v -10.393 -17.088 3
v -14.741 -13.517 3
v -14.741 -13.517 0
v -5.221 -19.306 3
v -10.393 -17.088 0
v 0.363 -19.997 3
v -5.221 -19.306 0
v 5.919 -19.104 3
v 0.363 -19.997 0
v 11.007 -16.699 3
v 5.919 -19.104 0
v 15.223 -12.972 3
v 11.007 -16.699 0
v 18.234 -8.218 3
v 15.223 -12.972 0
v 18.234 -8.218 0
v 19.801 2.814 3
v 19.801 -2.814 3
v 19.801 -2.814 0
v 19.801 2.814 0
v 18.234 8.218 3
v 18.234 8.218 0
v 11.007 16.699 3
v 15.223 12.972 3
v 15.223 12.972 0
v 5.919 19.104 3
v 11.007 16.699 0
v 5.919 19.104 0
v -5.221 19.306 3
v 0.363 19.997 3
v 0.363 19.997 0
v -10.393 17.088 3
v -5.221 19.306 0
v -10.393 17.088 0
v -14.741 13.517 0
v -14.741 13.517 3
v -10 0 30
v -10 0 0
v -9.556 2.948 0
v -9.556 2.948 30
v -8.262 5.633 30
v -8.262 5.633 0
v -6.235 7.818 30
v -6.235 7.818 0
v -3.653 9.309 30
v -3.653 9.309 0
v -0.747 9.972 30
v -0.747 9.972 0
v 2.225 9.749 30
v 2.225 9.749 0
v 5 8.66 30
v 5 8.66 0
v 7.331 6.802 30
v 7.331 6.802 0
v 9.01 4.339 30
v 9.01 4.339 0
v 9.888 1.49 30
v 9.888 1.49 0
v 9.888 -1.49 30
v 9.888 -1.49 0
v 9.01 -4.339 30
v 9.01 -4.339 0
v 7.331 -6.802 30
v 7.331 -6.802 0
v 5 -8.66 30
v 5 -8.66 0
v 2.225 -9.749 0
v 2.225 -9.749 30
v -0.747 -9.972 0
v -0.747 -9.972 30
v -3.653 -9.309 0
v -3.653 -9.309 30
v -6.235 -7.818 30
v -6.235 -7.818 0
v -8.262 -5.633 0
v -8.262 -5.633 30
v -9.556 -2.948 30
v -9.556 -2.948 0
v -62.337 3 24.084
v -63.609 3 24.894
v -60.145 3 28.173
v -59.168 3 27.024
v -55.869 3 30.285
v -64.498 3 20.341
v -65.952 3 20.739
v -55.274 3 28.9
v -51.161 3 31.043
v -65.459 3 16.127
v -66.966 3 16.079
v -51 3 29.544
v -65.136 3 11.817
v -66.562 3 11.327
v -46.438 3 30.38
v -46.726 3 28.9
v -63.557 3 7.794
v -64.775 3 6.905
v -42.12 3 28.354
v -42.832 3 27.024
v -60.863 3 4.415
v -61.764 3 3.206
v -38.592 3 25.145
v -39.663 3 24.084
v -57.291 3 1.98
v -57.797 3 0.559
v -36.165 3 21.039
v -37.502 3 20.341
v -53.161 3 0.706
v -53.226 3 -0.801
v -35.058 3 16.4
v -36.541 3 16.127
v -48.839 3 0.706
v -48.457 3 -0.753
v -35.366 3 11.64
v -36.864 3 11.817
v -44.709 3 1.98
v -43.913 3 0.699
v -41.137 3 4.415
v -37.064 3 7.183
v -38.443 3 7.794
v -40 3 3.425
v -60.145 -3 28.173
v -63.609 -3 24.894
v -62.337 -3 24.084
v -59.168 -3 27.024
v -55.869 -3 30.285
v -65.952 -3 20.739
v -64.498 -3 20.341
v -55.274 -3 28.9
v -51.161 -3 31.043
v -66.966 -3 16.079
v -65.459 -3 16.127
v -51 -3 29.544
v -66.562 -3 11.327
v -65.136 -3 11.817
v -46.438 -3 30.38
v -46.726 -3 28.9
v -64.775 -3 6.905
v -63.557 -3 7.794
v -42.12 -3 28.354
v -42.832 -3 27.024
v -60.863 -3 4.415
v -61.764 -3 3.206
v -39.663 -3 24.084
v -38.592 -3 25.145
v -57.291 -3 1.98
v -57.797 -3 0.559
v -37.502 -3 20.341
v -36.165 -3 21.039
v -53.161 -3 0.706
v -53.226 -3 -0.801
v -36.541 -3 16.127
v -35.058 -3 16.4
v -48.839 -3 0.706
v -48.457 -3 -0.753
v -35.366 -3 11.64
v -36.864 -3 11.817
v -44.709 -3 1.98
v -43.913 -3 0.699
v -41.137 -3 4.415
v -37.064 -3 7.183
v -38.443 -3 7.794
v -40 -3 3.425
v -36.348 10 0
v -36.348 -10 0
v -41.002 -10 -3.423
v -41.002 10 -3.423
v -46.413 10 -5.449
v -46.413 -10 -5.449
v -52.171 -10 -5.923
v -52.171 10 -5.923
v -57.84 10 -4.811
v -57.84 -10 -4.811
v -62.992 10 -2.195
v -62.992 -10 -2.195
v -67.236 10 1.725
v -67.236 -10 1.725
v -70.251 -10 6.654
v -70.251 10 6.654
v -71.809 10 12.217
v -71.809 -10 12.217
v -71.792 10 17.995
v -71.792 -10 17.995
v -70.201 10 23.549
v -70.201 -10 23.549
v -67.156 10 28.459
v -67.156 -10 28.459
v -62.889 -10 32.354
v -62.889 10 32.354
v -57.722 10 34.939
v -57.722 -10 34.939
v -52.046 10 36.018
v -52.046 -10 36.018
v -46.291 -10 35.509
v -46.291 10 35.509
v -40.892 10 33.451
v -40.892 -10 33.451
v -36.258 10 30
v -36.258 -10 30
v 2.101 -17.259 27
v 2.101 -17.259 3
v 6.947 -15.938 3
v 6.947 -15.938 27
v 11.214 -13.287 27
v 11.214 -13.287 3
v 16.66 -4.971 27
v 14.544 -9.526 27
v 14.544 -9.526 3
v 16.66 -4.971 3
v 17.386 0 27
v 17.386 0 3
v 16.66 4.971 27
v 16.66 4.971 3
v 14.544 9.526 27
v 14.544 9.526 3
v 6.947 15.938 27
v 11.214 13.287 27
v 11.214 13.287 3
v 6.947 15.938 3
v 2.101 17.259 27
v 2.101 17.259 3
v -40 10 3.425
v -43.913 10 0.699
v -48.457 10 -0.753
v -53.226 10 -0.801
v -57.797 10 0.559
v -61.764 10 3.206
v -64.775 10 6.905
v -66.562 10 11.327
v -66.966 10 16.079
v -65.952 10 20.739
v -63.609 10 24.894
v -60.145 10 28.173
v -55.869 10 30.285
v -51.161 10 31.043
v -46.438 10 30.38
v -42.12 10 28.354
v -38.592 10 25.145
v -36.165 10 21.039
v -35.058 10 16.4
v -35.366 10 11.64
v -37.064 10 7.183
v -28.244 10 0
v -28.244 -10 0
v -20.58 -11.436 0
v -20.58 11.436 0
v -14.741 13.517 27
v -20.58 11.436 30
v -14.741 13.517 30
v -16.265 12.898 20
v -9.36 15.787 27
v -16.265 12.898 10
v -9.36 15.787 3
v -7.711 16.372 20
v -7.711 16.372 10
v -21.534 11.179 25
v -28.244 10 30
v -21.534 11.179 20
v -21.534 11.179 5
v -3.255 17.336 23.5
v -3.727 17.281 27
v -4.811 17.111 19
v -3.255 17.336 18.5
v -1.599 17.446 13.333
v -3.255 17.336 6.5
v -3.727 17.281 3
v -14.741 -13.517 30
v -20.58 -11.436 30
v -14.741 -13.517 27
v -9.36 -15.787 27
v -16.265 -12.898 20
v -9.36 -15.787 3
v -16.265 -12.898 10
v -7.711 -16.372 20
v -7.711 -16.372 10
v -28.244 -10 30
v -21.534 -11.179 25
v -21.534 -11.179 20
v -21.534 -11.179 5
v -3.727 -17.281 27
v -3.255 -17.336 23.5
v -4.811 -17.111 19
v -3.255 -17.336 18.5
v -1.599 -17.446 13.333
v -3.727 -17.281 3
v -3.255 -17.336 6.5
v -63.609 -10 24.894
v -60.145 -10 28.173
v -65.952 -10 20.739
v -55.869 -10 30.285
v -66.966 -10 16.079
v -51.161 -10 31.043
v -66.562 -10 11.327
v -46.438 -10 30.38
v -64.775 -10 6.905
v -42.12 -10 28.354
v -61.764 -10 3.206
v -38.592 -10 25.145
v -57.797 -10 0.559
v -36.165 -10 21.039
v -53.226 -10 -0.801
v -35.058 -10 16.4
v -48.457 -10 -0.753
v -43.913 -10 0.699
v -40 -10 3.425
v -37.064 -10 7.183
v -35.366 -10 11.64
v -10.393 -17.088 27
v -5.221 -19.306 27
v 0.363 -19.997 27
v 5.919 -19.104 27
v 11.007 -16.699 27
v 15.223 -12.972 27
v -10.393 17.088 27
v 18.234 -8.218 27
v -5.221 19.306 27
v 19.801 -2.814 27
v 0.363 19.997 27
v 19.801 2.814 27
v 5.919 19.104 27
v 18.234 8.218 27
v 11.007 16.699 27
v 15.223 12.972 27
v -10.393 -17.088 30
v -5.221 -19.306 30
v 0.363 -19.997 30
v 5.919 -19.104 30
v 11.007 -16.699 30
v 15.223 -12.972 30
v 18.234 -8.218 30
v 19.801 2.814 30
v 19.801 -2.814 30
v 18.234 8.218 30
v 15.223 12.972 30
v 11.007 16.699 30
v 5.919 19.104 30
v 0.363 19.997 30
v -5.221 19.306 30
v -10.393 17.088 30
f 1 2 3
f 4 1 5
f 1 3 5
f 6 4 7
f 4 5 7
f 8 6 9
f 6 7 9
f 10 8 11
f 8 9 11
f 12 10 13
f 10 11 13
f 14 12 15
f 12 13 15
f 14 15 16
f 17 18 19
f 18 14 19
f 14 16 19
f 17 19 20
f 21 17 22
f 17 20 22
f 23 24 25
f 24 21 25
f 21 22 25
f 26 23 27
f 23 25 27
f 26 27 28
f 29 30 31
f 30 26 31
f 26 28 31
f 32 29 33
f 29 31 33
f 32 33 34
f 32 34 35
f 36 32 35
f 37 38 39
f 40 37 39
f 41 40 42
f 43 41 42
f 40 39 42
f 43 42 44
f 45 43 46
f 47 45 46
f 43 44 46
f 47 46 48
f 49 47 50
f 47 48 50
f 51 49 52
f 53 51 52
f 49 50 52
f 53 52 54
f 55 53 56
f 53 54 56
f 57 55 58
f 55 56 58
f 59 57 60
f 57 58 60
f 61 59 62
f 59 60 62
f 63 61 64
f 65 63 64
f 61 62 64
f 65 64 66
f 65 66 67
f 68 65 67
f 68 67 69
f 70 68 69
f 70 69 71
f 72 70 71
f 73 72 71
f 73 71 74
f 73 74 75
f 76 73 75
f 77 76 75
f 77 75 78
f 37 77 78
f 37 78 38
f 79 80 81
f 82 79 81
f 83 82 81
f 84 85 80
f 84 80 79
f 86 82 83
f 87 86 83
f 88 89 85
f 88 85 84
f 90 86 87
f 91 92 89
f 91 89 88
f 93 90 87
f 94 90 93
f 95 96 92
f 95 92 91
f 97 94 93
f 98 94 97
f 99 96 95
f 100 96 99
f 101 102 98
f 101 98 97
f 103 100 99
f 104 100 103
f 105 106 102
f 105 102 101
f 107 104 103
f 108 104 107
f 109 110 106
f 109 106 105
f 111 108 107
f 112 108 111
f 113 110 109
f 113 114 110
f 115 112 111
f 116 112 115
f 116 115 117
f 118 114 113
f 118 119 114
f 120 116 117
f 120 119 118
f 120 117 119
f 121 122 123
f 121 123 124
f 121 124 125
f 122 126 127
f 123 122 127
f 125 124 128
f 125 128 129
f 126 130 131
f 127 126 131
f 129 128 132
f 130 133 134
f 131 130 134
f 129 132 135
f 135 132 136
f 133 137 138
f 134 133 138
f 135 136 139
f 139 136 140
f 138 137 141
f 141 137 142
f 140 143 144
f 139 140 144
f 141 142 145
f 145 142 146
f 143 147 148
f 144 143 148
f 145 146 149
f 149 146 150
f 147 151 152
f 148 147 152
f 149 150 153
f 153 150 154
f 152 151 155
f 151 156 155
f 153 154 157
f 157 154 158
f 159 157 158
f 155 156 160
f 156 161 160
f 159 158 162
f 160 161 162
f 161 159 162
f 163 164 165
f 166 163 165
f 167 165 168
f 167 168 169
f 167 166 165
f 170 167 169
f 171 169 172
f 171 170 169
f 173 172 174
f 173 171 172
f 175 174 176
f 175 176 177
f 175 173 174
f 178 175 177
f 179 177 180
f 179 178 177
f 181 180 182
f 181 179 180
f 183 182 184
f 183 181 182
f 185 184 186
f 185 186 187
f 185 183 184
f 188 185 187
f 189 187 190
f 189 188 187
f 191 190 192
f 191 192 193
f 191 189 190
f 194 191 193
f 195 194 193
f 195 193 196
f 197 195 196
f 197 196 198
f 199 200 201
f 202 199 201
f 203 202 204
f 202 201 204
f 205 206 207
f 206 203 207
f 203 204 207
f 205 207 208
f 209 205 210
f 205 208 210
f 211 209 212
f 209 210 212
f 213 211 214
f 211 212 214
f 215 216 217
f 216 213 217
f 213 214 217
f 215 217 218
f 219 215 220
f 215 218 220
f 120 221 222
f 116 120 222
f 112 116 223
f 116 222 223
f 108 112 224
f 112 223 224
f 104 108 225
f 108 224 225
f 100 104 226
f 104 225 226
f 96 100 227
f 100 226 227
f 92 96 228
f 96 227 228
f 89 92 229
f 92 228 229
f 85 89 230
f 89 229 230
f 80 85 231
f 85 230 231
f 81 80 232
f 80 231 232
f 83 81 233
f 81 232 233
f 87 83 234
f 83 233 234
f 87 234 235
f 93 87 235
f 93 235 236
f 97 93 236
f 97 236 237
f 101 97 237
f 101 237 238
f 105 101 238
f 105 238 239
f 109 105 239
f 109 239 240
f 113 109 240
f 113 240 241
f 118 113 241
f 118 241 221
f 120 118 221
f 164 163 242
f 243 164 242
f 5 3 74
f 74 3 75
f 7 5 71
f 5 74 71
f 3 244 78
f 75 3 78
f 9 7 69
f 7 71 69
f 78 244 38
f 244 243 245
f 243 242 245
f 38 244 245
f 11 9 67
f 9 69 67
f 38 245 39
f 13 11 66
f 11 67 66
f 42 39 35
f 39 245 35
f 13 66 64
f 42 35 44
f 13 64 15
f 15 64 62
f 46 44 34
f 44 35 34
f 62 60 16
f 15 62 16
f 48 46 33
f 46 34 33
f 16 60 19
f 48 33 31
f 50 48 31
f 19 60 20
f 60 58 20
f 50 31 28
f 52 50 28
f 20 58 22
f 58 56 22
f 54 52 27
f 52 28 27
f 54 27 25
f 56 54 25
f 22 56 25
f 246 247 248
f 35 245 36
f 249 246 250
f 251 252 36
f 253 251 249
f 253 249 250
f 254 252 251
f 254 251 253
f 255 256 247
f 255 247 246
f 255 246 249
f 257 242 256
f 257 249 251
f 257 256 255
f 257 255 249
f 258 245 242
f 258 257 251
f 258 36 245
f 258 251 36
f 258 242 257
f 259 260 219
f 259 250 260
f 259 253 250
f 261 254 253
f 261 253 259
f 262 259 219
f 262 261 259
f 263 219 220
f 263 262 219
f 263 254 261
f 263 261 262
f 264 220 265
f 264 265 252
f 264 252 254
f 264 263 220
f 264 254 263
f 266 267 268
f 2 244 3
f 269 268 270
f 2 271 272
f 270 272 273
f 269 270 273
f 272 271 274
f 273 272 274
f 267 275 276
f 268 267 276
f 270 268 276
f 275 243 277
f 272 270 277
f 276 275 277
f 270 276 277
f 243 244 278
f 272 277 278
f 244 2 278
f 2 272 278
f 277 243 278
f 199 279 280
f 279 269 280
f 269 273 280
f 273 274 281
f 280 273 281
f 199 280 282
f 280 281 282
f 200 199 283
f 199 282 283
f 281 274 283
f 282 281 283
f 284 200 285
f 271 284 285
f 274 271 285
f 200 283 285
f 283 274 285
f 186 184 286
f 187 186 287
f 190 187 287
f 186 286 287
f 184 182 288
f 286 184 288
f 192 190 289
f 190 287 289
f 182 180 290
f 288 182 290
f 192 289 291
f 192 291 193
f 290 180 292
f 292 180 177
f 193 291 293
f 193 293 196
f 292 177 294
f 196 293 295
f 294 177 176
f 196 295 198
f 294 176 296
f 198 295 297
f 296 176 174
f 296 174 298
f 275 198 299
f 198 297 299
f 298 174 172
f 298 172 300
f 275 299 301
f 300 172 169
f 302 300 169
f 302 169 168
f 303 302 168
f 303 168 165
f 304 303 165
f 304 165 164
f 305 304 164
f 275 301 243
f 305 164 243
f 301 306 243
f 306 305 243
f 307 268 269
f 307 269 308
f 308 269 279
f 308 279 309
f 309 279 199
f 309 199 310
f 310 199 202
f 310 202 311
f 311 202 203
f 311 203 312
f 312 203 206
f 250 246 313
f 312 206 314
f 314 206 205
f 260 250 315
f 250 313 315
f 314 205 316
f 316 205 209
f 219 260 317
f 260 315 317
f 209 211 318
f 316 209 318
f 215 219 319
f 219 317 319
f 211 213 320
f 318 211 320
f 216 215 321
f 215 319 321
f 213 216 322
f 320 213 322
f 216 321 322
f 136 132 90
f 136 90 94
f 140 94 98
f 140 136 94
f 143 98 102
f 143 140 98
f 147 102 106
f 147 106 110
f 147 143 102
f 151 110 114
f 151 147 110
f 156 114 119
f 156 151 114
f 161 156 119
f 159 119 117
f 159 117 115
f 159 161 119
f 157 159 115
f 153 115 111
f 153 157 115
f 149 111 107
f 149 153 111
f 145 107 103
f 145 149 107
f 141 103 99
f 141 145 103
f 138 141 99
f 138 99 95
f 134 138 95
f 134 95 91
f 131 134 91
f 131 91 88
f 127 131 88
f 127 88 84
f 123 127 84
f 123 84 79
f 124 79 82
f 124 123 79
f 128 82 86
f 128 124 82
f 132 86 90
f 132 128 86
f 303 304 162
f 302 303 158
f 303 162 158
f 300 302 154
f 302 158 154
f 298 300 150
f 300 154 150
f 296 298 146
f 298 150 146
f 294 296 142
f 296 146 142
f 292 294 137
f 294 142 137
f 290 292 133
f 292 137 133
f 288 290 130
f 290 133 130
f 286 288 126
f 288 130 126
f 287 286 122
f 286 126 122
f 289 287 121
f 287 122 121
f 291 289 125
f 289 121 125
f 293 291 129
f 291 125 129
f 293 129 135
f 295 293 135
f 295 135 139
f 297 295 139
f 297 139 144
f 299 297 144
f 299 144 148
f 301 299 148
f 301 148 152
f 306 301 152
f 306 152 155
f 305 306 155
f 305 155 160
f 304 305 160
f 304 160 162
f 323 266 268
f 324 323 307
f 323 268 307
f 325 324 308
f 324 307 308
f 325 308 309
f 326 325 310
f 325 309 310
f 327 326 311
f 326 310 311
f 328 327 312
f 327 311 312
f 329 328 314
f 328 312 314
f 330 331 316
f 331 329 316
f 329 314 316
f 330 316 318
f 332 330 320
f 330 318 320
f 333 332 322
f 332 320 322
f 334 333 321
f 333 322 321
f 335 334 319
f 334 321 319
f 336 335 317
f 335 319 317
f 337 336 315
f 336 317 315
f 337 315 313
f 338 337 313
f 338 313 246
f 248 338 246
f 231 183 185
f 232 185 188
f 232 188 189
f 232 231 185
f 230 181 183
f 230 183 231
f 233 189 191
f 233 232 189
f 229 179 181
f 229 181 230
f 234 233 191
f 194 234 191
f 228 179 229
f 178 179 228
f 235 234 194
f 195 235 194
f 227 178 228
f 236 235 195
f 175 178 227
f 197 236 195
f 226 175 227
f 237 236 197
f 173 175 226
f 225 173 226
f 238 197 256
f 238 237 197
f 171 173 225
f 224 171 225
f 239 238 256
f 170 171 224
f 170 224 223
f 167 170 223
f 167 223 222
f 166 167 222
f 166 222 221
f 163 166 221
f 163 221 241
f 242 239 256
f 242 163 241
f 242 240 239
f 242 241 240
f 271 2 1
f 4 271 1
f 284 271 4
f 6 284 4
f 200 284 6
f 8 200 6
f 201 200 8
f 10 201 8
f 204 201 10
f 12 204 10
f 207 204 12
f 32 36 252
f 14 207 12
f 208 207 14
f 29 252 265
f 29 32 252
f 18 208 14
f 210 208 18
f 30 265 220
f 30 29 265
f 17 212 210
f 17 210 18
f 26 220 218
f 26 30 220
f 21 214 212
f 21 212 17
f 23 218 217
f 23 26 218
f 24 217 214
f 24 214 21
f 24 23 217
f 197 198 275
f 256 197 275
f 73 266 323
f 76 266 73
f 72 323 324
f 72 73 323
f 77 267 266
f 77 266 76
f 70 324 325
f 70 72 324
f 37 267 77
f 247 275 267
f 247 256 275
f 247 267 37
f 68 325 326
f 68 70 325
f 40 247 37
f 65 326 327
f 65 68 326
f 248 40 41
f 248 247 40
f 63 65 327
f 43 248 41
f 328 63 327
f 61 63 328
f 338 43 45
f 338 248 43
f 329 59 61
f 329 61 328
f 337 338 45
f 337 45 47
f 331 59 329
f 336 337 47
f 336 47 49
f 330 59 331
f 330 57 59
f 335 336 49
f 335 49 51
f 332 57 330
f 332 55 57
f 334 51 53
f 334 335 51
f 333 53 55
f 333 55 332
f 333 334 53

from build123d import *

# Parameters (mm, degrees)
SKETCH1_R                = 20
BOSS_EXTRUDE1_DEPTH      = 3
BOSS_EXTRUDE2_DEPTH      = 30
BOSS_EXTRUDE3_START      = -3
SKETCH3_R                = 20
BOSS_EXTRUDE3_DEPTH      = 3
SKETCH4_R                = 10
CUT_EXTRUDE1_DEPTH       = 43
SKETCH6_R                = 21
SKETCH6_R_2              = 16
BOSS_EXTRUDE4_DEPTH      = 20
SKETCH7_R                = 16
CUT_EXTRUDE2_DEPTH       = 20
BOSS_EXTRUDE5_DEPTH      = 3
BOSS_EXTRUDE5_DEPTH_BACK = 3
SKETCH8_R                = 21
SKETCH8_R_2              = 14.5


with BuildPart() as part:
    # Sketch1 → Boss-Extrude1 (new body)
    with BuildSketch(Plane.XY):
        Circle(SKETCH1_R)
    extrude(amount=BOSS_EXTRUDE1_DEPTH)

    # Sketch2 → Boss-Extrude2 (add)
    with BuildSketch(Plane(origin=(0, 0, 0), x_dir=(-1, 0, 0), z_dir=(0, 0, -1))):
        with BuildLine():
            Line((40, 10), (40, -10))
            Line((40, -10), (28.244450832, -10))
            add(Edge.make_bspline(
                [(28.244450832, -10), (12.990267169, -11.555535356), (9.900933724, -18.719511351), (-2.100622964, -17.258760722)],
                knots=[0, 0, 0, 0, 1, 1, 1, 1], degree=3))
            ThreePointArc((-2.100622964, -17.258760722), (-17.38612776, 0), (-2.100622964, 17.258760722))
            add(Edge.make_bspline(
                [(28.244450832, 10), (12.990267169, 11.555535356), (9.900933724, 18.719511351), (-2.100622964, 17.258760722)],
                knots=[0, 0, 0, 0, 1, 1, 1, 1], degree=3))
            Line((28.244450832, 10), (40, 10))
        make_face()
    extrude(amount=-BOSS_EXTRUDE2_DEPTH)

    # Sketch3 → Boss-Extrude3 (add)
    with BuildSketch(Plane.XY.offset(30).offset(BOSS_EXTRUDE3_START)):
        Circle(SKETCH3_R)
    extrude(amount=BOSS_EXTRUDE3_DEPTH)

    # Sketch4 → Cut-Extrude1 (cut)
    with BuildSketch(Plane(origin=(0, 0, 0), x_dir=(-1, 0, 0), z_dir=(0, 0, -1))):
        Circle(SKETCH4_R)
    extrude(amount=-CUT_EXTRUDE1_DEPTH, mode=Mode.SUBTRACT)

    # Sketch6 → Boss-Extrude4 (add)
    with BuildSketch(Plane(origin=(0, 10, 0), x_dir=(1, 0, 0), z_dir=(0, 1, 0))):
        with Locations((-51, -15.043878404)):
            Circle(SKETCH6_R)
        with Locations((-51, -15.043878404)):
            Circle(SKETCH6_R_2, mode=Mode.SUBTRACT)
    extrude(amount=-BOSS_EXTRUDE4_DEPTH)

    # Sketch7 → Cut-Extrude2 (cut)
    with BuildSketch(Plane(origin=(0, 10, 0), x_dir=(1, 0, 0), z_dir=(0, 1, 0))):
        with Locations(Location((-51, -15.043878404, 0), (0, 0, 180))):
            Circle(SKETCH7_R)
    extrude(amount=-CUT_EXTRUDE2_DEPTH, mode=Mode.SUBTRACT)

    # Sketch8 → Boss-Extrude5 (add, two sides: drawn at the far end of the back side and taken through both)
    with BuildSketch(Plane(origin=(0, 0, 0), x_dir=(1, 0, 0), z_dir=(0, 1, 0)).offset(-BOSS_EXTRUDE5_DEPTH_BACK)):
        with Locations((-51, -15.043878404)):
            Circle(SKETCH8_R)
        with Locations(Location((-51, -15.043878404, 0), (0, 0, 270))):
            Circle(SKETCH8_R_2, mode=Mode.SUBTRACT)
    extrude(amount=BOSS_EXTRUDE5_DEPTH + BOSS_EXTRUDE5_DEPTH_BACK)


solid = part.part
